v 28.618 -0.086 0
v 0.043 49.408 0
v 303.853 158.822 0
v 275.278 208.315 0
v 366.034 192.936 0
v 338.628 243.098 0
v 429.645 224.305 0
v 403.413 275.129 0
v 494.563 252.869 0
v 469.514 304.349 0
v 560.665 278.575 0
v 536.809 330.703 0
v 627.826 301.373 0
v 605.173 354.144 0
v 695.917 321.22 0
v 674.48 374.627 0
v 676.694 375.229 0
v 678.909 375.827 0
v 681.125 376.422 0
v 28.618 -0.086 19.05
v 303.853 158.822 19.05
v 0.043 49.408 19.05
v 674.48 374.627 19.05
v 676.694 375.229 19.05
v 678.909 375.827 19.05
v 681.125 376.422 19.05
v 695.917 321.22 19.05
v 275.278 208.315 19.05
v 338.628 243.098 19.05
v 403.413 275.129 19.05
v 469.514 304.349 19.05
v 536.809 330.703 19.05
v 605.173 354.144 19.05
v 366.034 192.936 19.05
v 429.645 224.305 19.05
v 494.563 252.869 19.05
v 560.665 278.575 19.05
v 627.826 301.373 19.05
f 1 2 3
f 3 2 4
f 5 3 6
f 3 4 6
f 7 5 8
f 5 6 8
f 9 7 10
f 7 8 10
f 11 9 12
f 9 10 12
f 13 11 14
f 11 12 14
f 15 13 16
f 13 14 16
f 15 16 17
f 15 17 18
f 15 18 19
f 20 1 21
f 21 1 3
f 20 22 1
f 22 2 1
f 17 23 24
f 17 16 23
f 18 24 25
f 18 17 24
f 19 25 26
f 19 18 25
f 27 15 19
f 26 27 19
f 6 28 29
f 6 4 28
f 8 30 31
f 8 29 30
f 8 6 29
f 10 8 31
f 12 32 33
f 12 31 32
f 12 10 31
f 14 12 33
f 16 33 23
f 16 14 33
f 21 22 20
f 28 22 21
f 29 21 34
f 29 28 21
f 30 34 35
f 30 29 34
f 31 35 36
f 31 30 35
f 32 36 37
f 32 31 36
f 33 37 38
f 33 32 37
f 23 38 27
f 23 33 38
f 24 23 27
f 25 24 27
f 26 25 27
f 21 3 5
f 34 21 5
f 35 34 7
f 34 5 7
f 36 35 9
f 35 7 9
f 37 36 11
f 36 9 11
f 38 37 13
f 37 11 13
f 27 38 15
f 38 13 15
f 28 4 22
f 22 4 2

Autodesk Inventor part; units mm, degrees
ref_plane "YZ Plane" through (0, 0, 0) normal (1, 0, 0) x (0, 1, 0)
ref_plane "XZ Plane" through (0, 0, 0) normal (0, 1, 0) x (-1, 0, 0)
ref_plane "XY Plane" through (0, 0, 0) normal (0, 0, 1) x (1, 0, 0)
sketch "Sketch1" plane through (0, 0, 0) normal (0, 0, 1) x (1, 0, 0)
  arc A0 (674.48, 374.6273) -> (275.278, 208.3151) centre (1116.653, -1248.9892) ccw
  line L0 (275.278, 208.3151) -> (0.0426, 49.4078)
  line L1 (0.0426, 49.4078) -> (28.6176, -0.0855)
  line L2 (28.6176, -0.0855) -> (303.853, 158.8217)
  arc A1 (695.9168, 321.2198) -> (303.853, 158.8217) centre (1116.653, -1248.9892) ccw
  line L3 (695.9168, 321.2198) -> (681.1253, 376.4225)
  arc A2 (681.1253, 376.4225) -> (275.278, 208.3151) centre (1116.653, -1248.9892) ccw
  line L4 (275.278, 208.3151) -> (0.0426, 49.4078)
  point P0 (0, 0)
extrude "Extrusion1" add sketch "Sketch1" along normal blind 19.05
properties part number "nd-15"
